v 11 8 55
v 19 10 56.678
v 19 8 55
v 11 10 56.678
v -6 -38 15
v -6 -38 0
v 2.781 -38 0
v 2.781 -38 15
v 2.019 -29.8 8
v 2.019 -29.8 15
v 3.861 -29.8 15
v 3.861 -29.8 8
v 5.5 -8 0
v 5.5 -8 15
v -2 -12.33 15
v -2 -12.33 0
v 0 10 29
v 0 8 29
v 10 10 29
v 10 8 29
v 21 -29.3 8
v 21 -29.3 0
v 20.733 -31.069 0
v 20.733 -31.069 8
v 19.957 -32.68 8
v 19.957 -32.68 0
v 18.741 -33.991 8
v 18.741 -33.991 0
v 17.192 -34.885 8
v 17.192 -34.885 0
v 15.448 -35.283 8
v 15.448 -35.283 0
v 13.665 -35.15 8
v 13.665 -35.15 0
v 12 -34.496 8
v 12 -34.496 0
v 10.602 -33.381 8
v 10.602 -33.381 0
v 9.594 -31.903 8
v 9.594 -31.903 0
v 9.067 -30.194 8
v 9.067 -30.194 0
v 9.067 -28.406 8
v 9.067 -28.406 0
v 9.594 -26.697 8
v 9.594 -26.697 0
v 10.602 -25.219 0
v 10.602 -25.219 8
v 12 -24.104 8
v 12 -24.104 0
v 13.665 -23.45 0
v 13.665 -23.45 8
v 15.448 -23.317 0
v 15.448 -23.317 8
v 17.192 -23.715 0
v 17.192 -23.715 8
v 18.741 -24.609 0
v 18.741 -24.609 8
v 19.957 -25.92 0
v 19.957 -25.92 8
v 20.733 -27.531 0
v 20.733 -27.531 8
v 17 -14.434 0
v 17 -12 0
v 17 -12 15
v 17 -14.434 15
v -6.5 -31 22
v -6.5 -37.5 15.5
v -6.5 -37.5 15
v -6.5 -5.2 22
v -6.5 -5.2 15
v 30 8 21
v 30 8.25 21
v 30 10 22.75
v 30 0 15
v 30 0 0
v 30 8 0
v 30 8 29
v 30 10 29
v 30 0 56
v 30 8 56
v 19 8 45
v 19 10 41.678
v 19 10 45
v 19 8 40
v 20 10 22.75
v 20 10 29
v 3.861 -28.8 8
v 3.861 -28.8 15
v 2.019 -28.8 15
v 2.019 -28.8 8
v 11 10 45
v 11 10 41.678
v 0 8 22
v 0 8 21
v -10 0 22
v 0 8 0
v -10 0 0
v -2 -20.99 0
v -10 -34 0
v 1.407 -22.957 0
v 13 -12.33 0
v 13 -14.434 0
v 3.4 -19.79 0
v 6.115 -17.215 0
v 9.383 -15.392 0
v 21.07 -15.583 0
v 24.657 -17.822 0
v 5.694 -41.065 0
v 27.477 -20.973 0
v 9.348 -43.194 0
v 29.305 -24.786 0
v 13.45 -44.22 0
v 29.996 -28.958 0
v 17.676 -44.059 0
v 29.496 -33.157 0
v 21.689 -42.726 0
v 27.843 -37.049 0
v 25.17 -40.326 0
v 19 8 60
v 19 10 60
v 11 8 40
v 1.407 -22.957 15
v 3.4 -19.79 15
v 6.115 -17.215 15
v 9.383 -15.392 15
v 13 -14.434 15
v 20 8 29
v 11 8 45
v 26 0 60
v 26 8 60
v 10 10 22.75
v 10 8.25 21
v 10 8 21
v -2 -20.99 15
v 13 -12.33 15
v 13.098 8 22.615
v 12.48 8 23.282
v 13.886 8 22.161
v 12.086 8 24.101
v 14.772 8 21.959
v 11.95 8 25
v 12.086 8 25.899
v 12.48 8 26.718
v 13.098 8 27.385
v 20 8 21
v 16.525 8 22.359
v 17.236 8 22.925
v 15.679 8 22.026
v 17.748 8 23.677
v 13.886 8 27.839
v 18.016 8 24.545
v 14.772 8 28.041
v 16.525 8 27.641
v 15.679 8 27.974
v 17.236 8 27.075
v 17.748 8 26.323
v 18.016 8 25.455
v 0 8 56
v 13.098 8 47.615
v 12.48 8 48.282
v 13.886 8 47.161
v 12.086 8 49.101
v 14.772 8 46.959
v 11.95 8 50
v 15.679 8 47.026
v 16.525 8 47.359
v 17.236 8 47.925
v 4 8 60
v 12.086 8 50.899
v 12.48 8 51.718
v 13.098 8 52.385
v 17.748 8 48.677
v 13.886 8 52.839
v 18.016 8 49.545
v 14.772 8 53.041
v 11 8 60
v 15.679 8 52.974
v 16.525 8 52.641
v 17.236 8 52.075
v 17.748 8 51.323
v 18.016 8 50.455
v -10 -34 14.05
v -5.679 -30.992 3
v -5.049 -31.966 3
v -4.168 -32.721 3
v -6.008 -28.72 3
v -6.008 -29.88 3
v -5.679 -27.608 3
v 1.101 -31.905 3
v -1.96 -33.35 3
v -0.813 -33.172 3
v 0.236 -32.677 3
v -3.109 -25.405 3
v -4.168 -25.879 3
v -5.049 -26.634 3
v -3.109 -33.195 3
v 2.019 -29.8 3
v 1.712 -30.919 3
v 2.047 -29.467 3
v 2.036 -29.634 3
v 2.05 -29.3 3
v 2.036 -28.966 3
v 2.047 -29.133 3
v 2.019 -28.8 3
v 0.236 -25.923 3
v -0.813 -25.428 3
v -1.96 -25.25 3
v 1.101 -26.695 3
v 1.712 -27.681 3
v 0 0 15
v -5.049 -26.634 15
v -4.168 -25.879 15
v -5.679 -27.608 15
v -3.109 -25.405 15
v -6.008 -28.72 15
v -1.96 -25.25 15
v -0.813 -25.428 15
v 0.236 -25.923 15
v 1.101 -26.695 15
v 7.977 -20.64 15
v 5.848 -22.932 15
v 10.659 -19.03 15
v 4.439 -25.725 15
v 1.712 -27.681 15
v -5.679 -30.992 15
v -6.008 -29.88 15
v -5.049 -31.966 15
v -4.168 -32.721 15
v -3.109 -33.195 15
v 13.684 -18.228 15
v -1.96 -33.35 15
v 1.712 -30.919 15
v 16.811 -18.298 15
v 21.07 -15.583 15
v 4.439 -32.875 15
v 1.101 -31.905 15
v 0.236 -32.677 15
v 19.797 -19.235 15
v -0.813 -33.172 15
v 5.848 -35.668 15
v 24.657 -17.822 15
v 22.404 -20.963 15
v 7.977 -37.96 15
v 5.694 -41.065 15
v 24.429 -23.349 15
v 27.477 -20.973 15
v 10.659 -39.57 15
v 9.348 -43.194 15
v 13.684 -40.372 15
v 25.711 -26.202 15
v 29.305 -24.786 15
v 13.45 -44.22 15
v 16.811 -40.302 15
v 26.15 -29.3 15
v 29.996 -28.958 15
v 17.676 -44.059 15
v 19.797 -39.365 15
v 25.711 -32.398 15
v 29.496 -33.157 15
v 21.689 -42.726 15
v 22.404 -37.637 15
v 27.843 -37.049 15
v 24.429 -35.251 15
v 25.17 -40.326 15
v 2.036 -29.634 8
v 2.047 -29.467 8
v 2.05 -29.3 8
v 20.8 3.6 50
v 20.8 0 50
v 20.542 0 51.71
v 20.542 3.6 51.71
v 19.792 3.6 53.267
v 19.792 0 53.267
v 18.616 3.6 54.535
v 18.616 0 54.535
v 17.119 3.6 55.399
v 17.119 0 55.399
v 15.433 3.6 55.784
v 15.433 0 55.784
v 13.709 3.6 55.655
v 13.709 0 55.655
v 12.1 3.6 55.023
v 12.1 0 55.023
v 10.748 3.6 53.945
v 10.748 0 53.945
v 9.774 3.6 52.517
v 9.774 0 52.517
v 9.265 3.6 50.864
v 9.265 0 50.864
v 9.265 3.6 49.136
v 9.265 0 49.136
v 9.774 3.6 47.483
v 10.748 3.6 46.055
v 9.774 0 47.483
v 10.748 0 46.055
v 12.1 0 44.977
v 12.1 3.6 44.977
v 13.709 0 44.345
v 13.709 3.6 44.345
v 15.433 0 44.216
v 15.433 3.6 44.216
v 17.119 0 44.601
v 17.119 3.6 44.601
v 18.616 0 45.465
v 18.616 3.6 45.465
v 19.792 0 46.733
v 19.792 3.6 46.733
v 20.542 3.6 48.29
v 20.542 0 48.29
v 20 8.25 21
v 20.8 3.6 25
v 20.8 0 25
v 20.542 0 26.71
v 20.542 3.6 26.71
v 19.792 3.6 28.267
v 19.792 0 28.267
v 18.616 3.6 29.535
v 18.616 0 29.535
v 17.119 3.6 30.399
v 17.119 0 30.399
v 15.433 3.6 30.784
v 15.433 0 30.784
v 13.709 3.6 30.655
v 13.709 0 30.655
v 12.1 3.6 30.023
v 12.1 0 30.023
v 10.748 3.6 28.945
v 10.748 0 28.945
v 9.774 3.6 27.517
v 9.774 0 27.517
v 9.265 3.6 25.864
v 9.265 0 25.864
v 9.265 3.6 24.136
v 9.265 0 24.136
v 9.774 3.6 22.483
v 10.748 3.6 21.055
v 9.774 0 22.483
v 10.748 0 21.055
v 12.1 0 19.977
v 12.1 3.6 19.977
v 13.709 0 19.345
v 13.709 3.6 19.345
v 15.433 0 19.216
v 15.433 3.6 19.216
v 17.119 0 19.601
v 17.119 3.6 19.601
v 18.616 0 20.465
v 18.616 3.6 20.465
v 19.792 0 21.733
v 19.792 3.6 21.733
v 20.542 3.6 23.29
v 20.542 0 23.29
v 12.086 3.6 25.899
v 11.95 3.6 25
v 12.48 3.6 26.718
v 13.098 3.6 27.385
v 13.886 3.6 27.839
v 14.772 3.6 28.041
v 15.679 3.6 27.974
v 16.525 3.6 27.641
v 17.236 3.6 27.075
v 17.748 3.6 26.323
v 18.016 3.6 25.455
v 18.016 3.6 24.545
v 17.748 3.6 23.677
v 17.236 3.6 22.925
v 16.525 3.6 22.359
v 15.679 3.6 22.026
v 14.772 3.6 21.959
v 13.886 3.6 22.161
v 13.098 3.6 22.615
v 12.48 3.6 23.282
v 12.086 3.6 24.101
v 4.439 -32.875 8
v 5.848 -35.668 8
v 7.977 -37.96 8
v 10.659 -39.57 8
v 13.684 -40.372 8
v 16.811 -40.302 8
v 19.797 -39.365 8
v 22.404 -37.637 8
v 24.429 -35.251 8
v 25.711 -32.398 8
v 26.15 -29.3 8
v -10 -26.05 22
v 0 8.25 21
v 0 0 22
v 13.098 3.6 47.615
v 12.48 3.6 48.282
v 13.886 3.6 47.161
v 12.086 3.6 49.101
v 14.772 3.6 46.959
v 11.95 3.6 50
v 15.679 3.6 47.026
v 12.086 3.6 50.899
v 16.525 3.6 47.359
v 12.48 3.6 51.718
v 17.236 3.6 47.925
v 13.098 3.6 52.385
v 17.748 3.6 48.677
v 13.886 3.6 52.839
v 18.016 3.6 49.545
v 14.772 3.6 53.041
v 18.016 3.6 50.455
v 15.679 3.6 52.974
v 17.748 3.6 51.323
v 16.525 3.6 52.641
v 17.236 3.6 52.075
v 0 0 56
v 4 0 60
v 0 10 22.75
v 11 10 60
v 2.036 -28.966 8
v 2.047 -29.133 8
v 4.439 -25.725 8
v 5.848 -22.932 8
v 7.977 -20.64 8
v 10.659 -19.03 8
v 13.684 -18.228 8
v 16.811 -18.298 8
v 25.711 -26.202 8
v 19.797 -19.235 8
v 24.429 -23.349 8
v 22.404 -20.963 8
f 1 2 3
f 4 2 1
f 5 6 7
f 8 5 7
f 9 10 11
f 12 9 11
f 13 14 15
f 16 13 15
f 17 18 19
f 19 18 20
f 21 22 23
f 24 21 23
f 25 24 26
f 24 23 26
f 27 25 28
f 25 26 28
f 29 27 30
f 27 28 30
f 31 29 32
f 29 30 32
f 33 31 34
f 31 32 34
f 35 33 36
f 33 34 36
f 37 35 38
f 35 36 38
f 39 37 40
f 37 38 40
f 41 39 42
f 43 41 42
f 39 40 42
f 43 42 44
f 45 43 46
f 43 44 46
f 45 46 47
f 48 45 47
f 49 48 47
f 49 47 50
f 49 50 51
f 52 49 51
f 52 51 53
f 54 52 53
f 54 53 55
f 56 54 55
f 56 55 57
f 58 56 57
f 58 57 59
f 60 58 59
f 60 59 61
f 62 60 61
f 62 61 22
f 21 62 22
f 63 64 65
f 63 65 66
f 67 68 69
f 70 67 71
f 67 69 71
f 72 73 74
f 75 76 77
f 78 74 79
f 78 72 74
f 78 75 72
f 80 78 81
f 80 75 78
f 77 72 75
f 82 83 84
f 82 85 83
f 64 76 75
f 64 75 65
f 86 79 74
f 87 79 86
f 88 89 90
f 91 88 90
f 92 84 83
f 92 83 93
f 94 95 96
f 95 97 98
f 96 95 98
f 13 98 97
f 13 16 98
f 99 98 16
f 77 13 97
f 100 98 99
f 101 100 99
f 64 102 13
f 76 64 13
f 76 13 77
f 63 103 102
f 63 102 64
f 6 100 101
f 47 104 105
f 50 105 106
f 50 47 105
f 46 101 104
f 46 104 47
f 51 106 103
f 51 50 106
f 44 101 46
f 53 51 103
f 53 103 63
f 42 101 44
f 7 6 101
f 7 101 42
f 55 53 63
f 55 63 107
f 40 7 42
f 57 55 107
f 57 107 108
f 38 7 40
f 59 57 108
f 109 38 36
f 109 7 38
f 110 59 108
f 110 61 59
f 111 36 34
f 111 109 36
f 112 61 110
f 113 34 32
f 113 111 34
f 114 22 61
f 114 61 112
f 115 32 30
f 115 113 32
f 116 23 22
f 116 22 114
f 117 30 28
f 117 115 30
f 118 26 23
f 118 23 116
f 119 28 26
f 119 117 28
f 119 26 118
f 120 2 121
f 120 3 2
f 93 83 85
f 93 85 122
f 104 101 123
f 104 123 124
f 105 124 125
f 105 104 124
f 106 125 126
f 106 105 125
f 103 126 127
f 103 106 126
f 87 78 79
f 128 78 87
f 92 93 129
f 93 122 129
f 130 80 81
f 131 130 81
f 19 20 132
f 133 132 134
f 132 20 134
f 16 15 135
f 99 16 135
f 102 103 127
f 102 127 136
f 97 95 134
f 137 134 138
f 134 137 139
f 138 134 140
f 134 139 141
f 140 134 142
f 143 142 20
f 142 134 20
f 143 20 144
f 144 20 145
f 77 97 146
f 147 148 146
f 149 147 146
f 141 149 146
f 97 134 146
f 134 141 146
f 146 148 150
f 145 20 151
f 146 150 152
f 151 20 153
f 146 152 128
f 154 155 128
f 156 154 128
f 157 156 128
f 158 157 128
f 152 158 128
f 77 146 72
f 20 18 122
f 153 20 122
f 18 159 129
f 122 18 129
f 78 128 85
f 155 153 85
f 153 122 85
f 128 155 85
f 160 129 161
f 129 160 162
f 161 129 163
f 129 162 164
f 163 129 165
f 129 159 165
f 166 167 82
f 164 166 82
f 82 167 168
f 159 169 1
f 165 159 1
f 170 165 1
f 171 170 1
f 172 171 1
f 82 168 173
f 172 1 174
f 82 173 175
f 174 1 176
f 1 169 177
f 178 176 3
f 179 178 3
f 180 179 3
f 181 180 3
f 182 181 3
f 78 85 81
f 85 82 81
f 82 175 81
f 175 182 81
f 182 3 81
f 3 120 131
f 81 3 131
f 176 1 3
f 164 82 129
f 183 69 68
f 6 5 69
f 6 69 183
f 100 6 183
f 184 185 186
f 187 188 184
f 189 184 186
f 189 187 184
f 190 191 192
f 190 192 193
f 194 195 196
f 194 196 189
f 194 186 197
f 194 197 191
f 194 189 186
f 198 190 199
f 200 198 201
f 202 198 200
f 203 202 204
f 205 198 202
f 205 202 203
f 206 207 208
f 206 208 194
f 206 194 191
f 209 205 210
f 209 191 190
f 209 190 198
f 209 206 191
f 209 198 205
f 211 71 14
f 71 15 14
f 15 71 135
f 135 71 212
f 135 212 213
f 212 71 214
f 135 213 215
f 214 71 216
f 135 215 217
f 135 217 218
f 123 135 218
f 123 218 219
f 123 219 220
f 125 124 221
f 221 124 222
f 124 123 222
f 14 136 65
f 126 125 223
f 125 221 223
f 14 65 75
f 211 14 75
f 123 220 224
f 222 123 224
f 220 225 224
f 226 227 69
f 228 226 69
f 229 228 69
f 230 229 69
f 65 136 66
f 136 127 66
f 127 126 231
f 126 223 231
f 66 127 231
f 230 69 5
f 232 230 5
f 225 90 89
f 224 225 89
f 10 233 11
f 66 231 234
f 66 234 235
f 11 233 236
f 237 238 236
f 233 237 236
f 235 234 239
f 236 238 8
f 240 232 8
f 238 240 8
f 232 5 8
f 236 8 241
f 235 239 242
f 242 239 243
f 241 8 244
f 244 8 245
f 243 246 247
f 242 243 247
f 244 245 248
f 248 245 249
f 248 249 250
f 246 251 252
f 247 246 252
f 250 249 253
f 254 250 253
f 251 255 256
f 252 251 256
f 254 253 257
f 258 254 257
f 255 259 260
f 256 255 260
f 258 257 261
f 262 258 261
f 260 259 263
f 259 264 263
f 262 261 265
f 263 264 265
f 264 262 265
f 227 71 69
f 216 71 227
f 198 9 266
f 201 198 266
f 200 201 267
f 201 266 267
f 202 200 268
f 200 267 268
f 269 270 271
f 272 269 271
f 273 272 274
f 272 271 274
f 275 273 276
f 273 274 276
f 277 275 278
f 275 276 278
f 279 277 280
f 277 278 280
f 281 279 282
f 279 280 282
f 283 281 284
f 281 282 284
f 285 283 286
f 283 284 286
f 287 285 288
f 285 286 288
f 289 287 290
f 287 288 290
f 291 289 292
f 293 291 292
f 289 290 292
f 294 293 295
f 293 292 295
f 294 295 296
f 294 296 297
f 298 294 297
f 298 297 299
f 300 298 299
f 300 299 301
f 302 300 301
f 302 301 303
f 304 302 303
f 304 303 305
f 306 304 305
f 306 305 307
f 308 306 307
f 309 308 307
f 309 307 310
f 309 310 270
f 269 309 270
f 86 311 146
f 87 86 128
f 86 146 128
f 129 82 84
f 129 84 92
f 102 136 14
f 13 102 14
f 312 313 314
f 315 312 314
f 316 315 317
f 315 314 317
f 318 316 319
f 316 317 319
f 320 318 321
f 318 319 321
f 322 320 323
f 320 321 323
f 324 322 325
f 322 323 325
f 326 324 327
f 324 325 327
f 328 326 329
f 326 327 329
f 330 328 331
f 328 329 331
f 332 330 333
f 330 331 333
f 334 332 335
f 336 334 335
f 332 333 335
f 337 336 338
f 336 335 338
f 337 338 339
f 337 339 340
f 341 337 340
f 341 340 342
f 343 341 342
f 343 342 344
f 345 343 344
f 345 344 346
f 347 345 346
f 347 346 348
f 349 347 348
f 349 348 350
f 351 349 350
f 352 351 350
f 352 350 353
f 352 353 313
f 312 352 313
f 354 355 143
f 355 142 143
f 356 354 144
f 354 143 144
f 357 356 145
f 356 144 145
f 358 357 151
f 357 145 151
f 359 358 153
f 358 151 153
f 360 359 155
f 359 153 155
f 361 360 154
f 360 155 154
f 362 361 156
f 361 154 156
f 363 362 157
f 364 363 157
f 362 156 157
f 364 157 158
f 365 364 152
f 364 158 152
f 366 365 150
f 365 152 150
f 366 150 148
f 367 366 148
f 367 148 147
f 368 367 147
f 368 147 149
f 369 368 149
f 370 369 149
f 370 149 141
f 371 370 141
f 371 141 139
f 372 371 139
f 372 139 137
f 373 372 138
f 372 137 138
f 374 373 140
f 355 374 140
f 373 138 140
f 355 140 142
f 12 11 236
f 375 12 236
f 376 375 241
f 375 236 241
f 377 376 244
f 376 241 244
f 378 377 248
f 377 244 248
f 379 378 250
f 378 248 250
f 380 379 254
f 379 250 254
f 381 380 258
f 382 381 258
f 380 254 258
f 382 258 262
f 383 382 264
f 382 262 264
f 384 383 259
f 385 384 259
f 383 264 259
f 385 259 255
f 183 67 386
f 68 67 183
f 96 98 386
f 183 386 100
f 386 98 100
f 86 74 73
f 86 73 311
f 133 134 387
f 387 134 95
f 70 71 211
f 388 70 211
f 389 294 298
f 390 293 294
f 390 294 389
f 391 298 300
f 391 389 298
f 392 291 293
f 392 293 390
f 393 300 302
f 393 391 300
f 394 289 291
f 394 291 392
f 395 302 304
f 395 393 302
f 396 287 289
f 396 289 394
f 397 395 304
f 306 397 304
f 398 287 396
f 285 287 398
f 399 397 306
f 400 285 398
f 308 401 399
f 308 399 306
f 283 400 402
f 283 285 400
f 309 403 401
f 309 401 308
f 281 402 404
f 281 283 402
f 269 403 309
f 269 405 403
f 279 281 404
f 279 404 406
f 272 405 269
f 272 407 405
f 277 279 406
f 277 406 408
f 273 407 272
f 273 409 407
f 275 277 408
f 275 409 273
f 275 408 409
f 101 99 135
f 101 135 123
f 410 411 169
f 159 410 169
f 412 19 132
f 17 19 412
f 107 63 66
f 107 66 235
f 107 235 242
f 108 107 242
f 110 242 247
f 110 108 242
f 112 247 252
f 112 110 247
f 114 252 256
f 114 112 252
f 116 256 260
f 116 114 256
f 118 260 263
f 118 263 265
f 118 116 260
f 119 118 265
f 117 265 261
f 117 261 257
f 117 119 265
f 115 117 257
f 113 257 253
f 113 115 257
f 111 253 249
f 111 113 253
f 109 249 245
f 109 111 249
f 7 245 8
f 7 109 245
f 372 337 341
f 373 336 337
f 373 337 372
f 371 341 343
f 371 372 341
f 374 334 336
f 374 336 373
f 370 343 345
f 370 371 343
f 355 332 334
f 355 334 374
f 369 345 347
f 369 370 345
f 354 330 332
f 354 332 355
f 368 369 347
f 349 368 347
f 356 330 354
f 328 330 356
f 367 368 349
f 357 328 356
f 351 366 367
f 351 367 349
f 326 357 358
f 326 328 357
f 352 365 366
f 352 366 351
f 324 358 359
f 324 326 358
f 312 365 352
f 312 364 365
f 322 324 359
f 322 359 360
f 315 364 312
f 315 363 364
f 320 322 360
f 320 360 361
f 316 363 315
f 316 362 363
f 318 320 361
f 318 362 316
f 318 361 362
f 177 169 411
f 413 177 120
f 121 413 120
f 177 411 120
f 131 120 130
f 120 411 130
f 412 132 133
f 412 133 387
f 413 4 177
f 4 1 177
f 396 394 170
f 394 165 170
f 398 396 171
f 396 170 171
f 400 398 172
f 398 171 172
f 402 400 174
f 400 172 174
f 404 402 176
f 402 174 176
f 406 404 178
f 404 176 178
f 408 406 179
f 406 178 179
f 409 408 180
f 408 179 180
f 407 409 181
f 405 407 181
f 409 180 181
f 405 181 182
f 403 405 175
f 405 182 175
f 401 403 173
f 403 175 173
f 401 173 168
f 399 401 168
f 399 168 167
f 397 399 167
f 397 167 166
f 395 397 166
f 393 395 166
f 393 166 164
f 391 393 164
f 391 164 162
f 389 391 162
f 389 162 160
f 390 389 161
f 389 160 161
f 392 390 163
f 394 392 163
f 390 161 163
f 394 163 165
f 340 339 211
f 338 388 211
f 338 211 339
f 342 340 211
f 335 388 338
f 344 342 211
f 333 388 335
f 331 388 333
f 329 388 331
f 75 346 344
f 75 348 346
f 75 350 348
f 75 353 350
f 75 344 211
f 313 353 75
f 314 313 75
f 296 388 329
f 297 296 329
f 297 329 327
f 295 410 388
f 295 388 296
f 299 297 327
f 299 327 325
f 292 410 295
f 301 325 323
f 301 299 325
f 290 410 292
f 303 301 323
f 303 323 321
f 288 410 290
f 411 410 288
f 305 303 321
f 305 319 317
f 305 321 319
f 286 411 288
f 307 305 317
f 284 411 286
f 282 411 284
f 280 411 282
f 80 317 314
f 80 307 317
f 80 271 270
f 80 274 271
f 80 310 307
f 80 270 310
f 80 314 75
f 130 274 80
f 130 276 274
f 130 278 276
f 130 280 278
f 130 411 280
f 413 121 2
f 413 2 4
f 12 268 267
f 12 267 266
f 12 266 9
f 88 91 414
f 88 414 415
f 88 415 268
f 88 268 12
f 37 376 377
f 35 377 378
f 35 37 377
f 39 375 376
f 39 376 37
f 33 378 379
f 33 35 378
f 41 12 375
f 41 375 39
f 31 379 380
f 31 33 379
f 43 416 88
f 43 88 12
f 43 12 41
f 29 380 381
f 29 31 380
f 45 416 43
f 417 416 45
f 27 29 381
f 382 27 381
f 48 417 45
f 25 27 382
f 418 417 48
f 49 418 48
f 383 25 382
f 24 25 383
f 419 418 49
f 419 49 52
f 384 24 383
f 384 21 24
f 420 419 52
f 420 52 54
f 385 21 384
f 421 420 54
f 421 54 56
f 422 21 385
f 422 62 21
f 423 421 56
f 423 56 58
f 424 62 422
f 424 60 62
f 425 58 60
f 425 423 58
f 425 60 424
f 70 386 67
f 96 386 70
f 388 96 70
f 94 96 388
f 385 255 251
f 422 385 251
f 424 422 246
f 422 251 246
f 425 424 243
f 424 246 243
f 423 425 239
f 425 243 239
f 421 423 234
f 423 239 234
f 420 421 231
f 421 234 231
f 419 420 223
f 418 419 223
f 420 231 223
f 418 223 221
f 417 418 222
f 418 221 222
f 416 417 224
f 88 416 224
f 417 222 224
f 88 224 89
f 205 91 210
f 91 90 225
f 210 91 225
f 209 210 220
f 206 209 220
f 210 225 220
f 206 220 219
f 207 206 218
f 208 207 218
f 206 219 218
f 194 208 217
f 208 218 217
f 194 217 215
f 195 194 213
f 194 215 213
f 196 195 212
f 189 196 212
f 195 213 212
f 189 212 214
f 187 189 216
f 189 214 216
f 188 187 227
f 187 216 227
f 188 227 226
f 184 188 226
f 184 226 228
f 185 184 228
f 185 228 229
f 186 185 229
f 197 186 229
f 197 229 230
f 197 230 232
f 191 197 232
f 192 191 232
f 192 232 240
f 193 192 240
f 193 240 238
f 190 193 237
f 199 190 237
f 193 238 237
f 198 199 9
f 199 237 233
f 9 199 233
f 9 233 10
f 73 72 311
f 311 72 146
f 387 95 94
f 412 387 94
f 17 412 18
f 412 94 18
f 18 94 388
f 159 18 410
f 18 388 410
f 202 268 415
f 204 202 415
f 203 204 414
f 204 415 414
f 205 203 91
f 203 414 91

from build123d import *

# Parameters (mm, degrees)
F0_W           = 30
F0_H           = 60
F1_DEPTH       = 8
F2_D           = 6.1
F2_CBORE_D     = 11.6
F2_CBORE_DEPTH = 3.6
F3_R           = 6
F4_DEPTH       = 15
F6_DEPTH       = 12
F5_R           = 6
F7_DEPTH       = 7
F9_DEPTH       = 7
F10_SIZE       = 7
F11_W          = 8
F11_H          = 5
F11_W_2        = 10
F11_H_2        = 8
F12_DEPTH      = 2
F13_SIZE2      = 1.678189
F13_SIZE       = 1.99999
F13_2_SIZE2    = 1.678189
F13_2_SIZE     = 1.99999
F14_SIZE2      = 1.75
F14_SIZE       = 1.75
F15_T1_DEPTH   = 35.5734639037
F16_SIZE       = 3.49999
F17_SIZE       = 4


# Not quite as in the source:
# - a fillet or chamfer that OpenCascade refuses, or shapes differently, is made with other operations: its cross-section is extruded or revolved along the edge and cut away or added
# - a fillet or chamfer is up to 0.001 mm smaller than in the source, because OpenCascade refuses the exact size


with BuildPart() as f1:
    # F0 (on Front) → F1 (new body)
    with BuildSketch(Plane.XZ):
        with Locations((15, 30)):
            Rectangle(F0_W, F0_H)
    extrude(amount=-F1_DEPTH)

    # F2 (through all)
    with Locations(Plane.XZ):
        with Locations((15, 50), (15, 25)):
            CounterBoreHole(F2_D / 2, F2_CBORE_D / 2, F2_CBORE_DEPTH)

    # F3 (on face) → F4 (join)
    with BuildSketch(Plane(origin=(0, 0, 0), x_dir=(1, 0, 0), z_dir=(0, 0, -1))):
        with BuildLine():
            Line((-10, 0), (0, -8))
            Line((0, -8), (0, 0))
            Line((0, 0), (30, 0))
            Line((30, 0), (17, 12))
            Line((17, 12), (17, 14.4339312527))
            ThreePointArc((17, 14.4339312527), (27.843214237, 37.0493127477), (2.7807528874, 38))
            Line((2.7807528874, 38), (-10, 38))
            Line((-10, 38), (-10, 0))
        make_face()
        Polygon((-2, 12.3301270189), (-2, 20.9903810568), (1.4069435951, 22.9573808585), (5.5, 25.3205080757), (13, 20.9903810568), (13, 14.4339312527), (13, 12.3301270189), (5.5, 8), align=None, mode=Mode.SUBTRACT)
        with Locations((15, 29.3)):
            Circle(F3_R, mode=Mode.SUBTRACT)
        with BuildLine():
            Line((5.5, 25.3205080757), (1.4069435951, 22.9573808585))
            ThreePointArc((1.4069435951, 22.9573808585), (6.1147228345, 17.2148086613), (13, 14.4339312527))
            Line((13, 14.4339312527), (13, 20.9903810568))
            Line((13, 20.9903810568), (5.5, 25.3205080757))
        make_face()
    extrude(amount=-F4_DEPTH)

    # F5 (on face) → F6 (cut)
    with BuildSketch(Plane.XY.offset(15)):
        with BuildLine():
            ThreePointArc((2.0190172928, -29.8), (2.0422469022, -29.5504795042), (2.05, -29.3))
            ThreePointArc((2.05, -29.3), (2.0422469022, -29.0495204958), (2.0190172928, -28.8))
            ThreePointArc((2.0190172928, -28.8), (-6.05, -29.3), (2.0190172928, -29.8))
        make_face()
    extrude(amount=-F6_DEPTH, mode=Mode.SUBTRACT)

    # F5 (on face) → F7 (cut)
    with BuildSketch(Plane.XY.offset(15)):
        with BuildLine():
            ThreePointArc((2.0190172928, -28.8), (2.0422469022, -29.0495204958), (2.05, -29.3))
            ThreePointArc((2.05, -29.3), (2.0422469022, -29.5504795042), (2.0190172928, -29.8))
            Line((2.0190172928, -29.8), (3.8612164039, -29.8))
            ThreePointArc((3.8612164039, -29.8), (3.85, -29.3), (3.8612164039, -28.8))
            Line((3.8612164039, -28.8), (2.0190172928, -28.8))
        make_face()
        with BuildLine():
            ThreePointArc((26.15, -29.3), (15.2500628959, -18.1528044537), (3.8612164039, -28.8))
            ThreePointArc((3.8612164039, -28.8), (3.85, -29.3), (3.8612164039, -29.8))
            ThreePointArc((3.8612164039, -29.8), (15.2500628959, -40.4471955463), (26.15, -29.3))
        make_face()
        with Locations((15, -29.3)):
            Circle(F5_R, mode=Mode.SUBTRACT)
        with Locations((15, -29.3)):
            Circle(F5_R)
    extrude(amount=-F7_DEPTH, mode=Mode.SUBTRACT)

    # F8 (on face) → F9 (join)
    with BuildSketch(Plane.XY.offset(15)):
        Polygon((-6.5, -5.2), (0, 0), (0, 8), (-10, 0), (-10, -38), (-6.5, -38), align=None)
    extrude(amount=F9_DEPTH)

    # F10
    f10_edges = [f1.edges().sort_by_distance(p)[0] for p in [
        (-8.25, -38, 22),
    ]]
    chamfer(f10_edges, length=F10_SIZE)

    # F11 (on face) → F12 (join)
    with BuildSketch(Plane(origin=(0, 8, 0), x_dir=(-1, 0, 0), z_dir=(0, 1, 0))):
        with Locations((-15, 57.5)):
            Rectangle(F11_W, F11_H)
        with Locations((-15, 42.5)):
            Rectangle(F11_W, F11_H)
        Polygon((0, 22), (0, 29), (-10, 29), (-10, 21), (0, 21), align=None)
        with Locations((-25, 25)):
            Rectangle(F11_W_2, F11_H_2)
    extrude(amount=F12_DEPTH)

    # F13 (size 2 and 1.6781992624 in the source; OpenCascade refuses exactly that, so slightly less here)
    f13_edges = [f1.edges().sort_by_distance(p)[0] for p in [
        (15, 10, 55),
    ]]
    f13_side = f1.faces().sort_by_distance((15, 9, 55))[0]
    chamfer(f13_edges, length=F13_SIZE, length2=F13_SIZE2, reference=f13_side)

    # F13#2 (size 2 and 1.6781992624 in the source; OpenCascade refuses exactly that, so slightly less here)
    f13_2_edges = [f1.edges().sort_by_distance(p)[0] for p in [
        (15, 10, 40),
    ]]
    f13_2_side = f1.faces().sort_by_distance((15, 9, 40))[0]
    chamfer(f13_2_edges, length=F13_2_SIZE, length2=F13_2_SIZE2, reference=f13_2_side)

    # F14
    f14_edges = [f1.edges().sort_by_distance(p)[0] for p in [
        (25, 10, 21),
        (5, 10, 21),
    ]]
    chamfer(f14_edges, length=F14_SIZE, length2=F14_SIZE2)

    # F15: chamfer of 4 on 1 edges, made by hand

    # F15_s2 → F15_t1 (cut)
    with BuildSketch(Plane.XY.offset(-10.2867319519)):
        Polygon((-6, -38), (-10, -34), (-10, -38), align=None)
    extrude(amount=F15_T1_DEPTH, mode=Mode.SUBTRACT)

    # F16 (size 3.5 in the source; OpenCascade refuses exactly that, so slightly less here)
    f16_edges = [f1.edges().sort_by_distance(p)[0] for p in [
        (-10, -32.5, 20.5),
    ]]
    chamfer(f16_edges, length=F16_SIZE)

    # F17
    f17_edges = [f1.edges().sort_by_distance(p)[0] for p in [
        (30, 4, 60),
        (0, 4, 60),
    ]]
    chamfer(f17_edges, length=F17_SIZE)


solid = f1.part
